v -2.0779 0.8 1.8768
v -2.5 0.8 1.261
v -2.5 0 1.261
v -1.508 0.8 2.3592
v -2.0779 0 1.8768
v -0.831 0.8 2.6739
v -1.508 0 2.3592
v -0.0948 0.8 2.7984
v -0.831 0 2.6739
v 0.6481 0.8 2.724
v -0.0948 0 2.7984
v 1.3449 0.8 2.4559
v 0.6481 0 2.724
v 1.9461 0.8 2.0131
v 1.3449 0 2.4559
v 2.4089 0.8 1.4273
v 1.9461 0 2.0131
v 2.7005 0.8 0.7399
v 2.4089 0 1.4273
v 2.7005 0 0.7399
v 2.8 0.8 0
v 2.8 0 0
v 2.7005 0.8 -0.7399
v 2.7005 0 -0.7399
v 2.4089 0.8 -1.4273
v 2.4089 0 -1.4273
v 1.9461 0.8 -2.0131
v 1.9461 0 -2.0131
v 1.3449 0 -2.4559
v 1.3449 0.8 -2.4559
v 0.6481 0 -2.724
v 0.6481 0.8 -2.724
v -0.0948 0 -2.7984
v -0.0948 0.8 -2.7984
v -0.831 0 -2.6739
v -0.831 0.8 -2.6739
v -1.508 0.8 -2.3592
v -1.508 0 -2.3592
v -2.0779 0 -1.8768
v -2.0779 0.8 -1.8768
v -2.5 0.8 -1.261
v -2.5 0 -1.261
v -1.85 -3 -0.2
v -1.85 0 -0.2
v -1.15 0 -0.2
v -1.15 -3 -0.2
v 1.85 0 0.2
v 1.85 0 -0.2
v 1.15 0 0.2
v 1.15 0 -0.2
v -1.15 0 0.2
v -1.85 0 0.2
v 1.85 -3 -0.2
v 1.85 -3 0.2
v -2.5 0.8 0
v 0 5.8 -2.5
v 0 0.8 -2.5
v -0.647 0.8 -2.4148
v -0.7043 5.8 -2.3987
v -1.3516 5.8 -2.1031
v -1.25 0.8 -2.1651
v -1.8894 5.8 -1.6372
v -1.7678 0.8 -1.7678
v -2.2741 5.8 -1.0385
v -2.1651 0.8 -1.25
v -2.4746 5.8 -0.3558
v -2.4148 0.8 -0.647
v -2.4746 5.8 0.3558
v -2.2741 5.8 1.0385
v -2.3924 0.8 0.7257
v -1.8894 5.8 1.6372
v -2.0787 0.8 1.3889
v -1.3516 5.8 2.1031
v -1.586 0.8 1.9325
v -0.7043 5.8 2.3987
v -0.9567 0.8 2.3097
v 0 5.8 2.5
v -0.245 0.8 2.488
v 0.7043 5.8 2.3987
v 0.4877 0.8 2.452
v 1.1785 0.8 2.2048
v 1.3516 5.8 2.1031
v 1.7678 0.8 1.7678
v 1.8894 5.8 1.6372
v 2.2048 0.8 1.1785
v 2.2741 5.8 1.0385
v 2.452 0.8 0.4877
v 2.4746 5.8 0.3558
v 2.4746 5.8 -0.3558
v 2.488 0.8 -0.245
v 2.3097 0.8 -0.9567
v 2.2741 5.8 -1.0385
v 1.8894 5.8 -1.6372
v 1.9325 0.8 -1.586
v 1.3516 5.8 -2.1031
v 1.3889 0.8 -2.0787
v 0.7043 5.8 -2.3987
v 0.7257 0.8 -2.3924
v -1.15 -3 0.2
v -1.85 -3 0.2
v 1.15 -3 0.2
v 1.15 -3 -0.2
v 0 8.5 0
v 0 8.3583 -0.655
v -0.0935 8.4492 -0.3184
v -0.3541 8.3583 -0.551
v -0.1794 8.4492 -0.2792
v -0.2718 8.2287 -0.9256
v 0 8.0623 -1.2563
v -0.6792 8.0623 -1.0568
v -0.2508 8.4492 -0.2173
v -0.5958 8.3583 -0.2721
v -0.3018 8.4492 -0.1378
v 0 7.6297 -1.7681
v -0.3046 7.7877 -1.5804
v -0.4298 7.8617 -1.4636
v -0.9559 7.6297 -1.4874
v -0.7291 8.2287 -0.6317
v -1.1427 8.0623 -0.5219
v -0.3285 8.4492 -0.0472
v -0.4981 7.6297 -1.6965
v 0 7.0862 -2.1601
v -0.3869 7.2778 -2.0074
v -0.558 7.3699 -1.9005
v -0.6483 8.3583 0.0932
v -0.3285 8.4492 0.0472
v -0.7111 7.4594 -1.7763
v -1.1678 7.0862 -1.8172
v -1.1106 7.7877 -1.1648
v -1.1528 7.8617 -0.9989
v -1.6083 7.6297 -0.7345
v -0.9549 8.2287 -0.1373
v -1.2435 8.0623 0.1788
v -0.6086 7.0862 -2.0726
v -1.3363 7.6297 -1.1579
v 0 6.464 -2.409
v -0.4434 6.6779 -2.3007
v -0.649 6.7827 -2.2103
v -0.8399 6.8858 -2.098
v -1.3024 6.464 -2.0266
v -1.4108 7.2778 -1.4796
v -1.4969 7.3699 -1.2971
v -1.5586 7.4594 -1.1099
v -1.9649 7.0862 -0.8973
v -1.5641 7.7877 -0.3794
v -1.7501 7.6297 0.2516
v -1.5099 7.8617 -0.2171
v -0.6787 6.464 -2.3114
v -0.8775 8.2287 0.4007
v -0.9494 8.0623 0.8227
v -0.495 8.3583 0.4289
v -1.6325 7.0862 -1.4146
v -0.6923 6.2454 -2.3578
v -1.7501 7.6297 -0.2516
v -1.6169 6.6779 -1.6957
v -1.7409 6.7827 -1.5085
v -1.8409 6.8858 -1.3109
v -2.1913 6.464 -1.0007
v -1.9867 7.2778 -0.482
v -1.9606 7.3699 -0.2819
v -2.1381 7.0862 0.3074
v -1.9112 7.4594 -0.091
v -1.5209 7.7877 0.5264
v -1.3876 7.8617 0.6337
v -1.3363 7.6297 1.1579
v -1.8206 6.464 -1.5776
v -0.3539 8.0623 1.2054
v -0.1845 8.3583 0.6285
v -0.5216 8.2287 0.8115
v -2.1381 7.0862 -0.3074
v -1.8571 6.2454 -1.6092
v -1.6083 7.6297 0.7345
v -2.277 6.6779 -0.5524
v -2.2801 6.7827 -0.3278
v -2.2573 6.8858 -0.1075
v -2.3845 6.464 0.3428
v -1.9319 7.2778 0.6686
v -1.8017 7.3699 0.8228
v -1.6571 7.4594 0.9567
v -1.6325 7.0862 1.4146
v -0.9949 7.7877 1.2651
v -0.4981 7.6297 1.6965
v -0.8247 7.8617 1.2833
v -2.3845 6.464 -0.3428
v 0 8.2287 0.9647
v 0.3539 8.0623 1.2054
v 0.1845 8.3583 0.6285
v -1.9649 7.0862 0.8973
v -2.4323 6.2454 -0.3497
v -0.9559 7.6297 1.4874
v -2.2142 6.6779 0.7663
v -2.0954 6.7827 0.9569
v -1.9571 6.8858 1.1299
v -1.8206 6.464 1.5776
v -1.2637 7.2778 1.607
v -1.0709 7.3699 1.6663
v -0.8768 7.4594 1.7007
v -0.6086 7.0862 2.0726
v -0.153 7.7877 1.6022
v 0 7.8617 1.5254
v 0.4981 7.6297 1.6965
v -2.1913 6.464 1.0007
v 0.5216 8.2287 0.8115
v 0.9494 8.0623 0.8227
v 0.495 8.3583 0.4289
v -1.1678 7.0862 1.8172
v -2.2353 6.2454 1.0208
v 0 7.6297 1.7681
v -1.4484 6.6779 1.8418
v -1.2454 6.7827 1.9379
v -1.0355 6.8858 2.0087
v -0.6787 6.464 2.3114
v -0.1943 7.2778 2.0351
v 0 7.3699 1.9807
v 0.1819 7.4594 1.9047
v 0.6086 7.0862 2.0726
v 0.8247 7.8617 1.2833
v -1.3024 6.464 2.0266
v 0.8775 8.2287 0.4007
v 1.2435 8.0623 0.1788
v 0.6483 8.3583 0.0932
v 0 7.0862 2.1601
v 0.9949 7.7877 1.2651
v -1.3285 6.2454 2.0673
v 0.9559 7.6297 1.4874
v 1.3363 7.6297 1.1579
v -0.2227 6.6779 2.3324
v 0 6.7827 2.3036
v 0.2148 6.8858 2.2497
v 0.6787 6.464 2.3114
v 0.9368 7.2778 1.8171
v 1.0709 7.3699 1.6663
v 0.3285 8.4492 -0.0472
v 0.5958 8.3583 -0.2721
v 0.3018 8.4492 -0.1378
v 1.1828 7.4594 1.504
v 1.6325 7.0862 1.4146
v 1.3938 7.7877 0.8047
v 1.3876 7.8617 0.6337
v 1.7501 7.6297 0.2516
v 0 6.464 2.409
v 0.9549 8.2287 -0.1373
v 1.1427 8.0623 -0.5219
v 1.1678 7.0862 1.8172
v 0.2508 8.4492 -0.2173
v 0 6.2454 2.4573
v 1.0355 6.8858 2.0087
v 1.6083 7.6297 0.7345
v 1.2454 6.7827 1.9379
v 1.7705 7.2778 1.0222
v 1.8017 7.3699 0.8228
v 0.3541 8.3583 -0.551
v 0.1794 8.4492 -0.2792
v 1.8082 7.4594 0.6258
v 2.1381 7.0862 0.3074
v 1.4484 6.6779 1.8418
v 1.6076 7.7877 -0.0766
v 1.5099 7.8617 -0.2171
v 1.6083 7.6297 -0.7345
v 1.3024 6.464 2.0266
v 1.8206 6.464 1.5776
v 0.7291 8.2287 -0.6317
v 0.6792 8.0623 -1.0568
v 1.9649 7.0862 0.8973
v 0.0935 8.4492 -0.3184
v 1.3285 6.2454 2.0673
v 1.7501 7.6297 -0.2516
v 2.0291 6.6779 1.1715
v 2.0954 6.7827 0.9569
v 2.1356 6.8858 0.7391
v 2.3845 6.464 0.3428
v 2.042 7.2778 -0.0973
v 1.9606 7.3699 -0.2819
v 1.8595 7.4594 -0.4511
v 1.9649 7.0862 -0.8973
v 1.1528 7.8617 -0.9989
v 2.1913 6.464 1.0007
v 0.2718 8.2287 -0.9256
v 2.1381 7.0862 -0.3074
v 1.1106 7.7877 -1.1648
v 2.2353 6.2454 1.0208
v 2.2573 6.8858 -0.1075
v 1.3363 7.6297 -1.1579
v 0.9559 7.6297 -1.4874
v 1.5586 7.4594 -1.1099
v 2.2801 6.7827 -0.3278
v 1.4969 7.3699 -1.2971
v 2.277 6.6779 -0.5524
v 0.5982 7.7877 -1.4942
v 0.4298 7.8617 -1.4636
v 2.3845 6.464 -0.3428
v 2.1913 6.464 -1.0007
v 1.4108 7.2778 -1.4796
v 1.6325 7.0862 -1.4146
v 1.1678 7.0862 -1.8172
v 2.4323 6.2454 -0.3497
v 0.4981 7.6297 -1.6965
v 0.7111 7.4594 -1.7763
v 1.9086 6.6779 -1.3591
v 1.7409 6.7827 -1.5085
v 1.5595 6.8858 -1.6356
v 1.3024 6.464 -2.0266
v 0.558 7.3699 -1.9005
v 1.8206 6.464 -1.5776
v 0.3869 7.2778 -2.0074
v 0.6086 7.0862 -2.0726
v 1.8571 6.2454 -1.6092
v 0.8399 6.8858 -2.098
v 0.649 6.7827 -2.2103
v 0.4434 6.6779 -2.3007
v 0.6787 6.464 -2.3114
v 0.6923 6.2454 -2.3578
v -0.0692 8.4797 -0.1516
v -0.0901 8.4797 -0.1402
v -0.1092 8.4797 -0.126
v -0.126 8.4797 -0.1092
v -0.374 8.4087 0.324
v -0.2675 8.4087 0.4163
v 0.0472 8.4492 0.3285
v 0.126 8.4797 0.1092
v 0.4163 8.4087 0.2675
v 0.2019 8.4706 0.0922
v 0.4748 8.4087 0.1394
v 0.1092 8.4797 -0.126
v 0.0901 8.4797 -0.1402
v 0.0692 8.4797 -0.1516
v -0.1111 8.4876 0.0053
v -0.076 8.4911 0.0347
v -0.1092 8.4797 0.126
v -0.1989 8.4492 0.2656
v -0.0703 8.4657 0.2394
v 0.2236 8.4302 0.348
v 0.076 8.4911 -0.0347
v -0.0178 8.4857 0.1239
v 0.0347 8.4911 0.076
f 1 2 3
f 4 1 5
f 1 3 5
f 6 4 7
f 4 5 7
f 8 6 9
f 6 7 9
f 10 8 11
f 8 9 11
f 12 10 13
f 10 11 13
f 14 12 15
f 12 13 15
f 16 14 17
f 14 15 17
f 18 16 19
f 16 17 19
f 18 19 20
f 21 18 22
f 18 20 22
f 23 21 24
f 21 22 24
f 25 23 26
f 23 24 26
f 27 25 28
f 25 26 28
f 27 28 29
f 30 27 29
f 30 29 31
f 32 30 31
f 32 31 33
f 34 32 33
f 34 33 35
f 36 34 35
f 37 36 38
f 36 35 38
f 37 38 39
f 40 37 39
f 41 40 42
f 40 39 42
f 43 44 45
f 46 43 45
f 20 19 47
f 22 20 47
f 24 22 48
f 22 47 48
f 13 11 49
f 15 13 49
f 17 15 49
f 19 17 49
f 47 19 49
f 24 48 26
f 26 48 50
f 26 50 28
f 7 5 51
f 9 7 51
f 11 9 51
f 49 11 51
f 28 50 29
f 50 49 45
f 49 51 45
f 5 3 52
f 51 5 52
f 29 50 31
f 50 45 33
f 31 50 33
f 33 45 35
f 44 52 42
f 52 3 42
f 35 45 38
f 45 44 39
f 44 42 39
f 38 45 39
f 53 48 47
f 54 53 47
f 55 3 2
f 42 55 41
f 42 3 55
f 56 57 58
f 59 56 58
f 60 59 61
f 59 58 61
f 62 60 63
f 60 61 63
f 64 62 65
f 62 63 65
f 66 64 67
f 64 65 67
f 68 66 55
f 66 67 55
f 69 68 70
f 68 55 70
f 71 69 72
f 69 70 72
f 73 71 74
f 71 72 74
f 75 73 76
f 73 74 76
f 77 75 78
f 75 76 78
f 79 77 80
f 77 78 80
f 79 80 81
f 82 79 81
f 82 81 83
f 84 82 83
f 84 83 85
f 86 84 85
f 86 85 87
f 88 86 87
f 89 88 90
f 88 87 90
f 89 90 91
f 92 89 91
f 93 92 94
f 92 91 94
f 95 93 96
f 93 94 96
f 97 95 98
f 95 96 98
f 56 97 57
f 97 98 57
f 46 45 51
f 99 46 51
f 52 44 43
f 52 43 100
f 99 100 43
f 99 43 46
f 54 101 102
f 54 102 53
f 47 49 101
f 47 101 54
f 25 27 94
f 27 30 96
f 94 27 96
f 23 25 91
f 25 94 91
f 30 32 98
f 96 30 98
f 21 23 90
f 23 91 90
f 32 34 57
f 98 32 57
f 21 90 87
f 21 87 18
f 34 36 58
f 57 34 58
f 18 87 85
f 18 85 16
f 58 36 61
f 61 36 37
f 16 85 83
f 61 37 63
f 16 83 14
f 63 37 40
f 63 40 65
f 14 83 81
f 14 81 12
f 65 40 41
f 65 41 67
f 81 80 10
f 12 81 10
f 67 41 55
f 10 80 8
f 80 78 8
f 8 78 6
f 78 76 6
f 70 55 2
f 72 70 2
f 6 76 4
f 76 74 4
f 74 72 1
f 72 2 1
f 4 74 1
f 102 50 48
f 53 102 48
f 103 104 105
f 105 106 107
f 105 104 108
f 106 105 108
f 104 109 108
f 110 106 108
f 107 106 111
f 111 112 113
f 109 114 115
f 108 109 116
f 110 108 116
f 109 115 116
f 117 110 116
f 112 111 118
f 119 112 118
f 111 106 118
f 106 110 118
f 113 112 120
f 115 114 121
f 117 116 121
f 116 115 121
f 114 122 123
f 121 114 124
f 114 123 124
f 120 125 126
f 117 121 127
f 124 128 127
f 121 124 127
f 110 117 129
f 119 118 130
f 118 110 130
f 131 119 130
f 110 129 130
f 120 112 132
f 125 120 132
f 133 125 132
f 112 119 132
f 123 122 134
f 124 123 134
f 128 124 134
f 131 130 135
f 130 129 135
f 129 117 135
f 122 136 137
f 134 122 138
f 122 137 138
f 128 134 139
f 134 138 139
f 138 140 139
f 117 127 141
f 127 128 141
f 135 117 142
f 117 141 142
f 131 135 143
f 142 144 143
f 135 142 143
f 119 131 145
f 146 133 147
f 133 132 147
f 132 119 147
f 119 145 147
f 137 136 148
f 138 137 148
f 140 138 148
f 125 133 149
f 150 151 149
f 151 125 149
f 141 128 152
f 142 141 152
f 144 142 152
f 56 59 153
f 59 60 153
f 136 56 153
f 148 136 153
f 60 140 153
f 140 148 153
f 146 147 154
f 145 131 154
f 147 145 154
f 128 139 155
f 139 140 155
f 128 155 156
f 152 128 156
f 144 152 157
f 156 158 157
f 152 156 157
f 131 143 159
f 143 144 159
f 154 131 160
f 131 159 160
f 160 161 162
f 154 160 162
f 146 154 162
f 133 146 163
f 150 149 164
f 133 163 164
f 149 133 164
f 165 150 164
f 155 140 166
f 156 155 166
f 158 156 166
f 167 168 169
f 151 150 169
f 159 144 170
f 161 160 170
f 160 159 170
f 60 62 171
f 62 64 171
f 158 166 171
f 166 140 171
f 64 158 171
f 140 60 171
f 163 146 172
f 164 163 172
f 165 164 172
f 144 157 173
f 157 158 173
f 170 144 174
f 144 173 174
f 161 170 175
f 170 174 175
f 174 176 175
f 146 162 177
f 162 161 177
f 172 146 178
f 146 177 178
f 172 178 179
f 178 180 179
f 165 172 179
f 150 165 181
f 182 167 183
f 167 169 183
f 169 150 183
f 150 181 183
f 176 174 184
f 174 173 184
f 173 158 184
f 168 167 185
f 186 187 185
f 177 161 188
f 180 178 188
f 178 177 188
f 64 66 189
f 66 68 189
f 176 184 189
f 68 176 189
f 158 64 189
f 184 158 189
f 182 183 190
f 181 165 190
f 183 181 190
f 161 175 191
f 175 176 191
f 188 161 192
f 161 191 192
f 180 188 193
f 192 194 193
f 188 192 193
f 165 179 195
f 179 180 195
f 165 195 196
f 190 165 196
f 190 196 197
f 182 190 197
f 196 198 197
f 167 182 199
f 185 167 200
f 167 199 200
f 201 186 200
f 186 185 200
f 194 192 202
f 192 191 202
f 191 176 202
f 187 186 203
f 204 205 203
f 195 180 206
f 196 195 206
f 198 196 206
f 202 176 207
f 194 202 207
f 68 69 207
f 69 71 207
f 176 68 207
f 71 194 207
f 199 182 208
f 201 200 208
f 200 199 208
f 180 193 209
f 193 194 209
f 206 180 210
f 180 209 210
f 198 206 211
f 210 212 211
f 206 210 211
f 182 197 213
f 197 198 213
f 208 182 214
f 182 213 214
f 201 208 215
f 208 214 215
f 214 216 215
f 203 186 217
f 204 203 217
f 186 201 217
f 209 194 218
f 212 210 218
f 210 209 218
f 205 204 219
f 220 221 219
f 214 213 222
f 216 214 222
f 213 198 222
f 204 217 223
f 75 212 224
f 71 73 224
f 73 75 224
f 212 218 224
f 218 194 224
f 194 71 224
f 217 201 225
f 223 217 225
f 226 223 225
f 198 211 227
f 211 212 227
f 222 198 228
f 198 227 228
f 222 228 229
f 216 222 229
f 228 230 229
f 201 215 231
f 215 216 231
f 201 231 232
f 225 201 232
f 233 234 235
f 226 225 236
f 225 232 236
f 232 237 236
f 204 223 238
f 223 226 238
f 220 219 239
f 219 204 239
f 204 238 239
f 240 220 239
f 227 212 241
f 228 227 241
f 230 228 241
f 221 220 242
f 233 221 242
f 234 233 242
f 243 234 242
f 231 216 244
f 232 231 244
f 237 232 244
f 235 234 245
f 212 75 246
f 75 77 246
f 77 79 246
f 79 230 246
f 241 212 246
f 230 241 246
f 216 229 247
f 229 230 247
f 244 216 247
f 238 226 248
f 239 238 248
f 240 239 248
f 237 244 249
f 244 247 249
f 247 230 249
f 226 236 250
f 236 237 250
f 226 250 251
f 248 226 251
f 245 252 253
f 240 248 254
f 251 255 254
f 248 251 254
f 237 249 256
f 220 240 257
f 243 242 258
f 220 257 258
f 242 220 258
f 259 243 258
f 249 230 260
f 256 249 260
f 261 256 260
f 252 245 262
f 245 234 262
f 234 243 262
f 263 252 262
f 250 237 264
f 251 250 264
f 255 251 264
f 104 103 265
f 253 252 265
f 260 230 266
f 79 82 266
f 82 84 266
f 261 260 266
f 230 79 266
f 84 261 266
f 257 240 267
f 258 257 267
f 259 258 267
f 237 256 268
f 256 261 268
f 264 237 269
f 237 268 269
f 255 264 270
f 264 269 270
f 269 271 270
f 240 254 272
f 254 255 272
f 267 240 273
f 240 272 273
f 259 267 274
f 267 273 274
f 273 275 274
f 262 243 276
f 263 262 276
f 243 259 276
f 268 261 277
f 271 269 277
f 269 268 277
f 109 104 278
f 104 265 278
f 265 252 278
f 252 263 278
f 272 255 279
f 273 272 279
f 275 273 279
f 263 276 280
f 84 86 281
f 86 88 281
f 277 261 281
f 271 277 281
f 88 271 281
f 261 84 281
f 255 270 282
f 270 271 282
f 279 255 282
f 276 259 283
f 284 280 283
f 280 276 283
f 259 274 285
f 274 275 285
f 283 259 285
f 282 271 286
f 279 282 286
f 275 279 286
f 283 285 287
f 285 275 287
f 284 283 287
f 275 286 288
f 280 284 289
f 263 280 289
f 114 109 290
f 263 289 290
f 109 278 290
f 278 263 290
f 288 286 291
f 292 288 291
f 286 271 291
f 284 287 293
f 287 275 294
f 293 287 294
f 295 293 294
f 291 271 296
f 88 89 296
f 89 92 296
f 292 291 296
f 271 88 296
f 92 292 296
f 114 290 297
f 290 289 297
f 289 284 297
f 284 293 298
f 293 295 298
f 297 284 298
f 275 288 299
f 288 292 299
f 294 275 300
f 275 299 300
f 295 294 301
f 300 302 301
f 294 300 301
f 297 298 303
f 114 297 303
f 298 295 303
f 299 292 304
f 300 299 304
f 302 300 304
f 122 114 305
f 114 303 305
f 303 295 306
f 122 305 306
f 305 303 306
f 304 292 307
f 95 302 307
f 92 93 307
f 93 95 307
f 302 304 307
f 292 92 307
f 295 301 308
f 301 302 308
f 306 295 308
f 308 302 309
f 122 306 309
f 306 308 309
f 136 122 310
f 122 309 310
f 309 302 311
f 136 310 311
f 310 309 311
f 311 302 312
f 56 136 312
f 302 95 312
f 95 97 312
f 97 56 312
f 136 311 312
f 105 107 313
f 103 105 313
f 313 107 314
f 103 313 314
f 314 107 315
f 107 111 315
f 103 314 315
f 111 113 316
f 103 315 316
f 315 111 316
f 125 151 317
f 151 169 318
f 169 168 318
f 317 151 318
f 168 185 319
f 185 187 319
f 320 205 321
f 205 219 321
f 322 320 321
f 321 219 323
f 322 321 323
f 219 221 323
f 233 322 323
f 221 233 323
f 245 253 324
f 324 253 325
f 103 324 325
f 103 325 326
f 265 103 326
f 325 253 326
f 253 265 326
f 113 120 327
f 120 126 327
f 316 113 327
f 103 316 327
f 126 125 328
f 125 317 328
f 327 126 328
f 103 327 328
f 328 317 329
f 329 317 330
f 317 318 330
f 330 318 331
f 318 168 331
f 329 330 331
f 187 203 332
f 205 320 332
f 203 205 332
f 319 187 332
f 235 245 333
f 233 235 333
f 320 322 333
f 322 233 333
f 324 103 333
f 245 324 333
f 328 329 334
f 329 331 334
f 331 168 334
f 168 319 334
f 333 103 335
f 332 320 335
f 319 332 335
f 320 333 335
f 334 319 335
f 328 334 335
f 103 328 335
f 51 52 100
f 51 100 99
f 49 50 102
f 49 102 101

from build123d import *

# Parameters (mm, degrees)
CORTAR_EXTRUIR1_START   = -10
CORTAR_EXTRUIR1_DEPTH   = 10
CROQUIS3_W              = 0.7
CROQUIS3_H              = 0.4
SALIENTE_EXTRUIR1_DEPTH = 3


with BuildPart() as part:
    # Croquis1 → Revolución1 (revolve)
    with BuildSketch(Plane.XY, mode=Mode.PRIVATE) as revoluci_n1_sk:
        with BuildLine():
            Line((0, 0), (0, 8.5))
            ThreePointArc((0, 8.5), (1.768113296, 7.629734533), (2.5, 5.8))
            Line((2.5, 5.8), (2.5, 0.8))
            Line((2.5, 0.8), (2.8, 0.8))
            Line((2.8, 0.8), (2.8, 0))
            Line((2.8, 0), (0, 0))
        make_face()
    revolve(revoluci_n1_sk.sketch.rotate(Axis((0, 0, 0), (0, 1, 0)), 90), axis=Axis((0, 0, 0), (0, 1, 0)))

    # Croquis2 → Cortar-Extruir1 (cut)
    with BuildSketch(Plane(origin=(0, 0.8, 0), x_dir=(1, 0, 0), z_dir=(0, 1, 0)).offset(CORTAR_EXTRUIR1_START)):
        with BuildLine():
            Line((-2.5, -1.260952021), (-2.5, 0))
            Line((-2.5, 0), (-2.8, 0))
            ThreePointArc((-2.8, 0), (-2.723967694, -0.64807407), (-2.5, -1.260952021))
        make_face()
        with BuildLine():
            Line((-2.8, 0), (-2.5, 0))
            Line((-2.5, 0), (-2.5, 1.260952021))
            ThreePointArc((-2.5, 1.260952021), (-2.723967694, 0.64807407), (-2.8, 0))
        make_face()
    extrude(amount=CORTAR_EXTRUIR1_DEPTH, mode=Mode.SUBTRACT)

    # Croquis3 → Saliente-Extruir1 (add)
    with BuildSketch(Plane.XZ):
        with Locations((-1.5, 0)):
            Rectangle(CROQUIS3_W, CROQUIS3_H)
        with Locations((1.5, 0)):
            Rectangle(CROQUIS3_W, CROQUIS3_H)
    extrude(amount=SALIENTE_EXTRUIR1_DEPTH)


solid = part.part
